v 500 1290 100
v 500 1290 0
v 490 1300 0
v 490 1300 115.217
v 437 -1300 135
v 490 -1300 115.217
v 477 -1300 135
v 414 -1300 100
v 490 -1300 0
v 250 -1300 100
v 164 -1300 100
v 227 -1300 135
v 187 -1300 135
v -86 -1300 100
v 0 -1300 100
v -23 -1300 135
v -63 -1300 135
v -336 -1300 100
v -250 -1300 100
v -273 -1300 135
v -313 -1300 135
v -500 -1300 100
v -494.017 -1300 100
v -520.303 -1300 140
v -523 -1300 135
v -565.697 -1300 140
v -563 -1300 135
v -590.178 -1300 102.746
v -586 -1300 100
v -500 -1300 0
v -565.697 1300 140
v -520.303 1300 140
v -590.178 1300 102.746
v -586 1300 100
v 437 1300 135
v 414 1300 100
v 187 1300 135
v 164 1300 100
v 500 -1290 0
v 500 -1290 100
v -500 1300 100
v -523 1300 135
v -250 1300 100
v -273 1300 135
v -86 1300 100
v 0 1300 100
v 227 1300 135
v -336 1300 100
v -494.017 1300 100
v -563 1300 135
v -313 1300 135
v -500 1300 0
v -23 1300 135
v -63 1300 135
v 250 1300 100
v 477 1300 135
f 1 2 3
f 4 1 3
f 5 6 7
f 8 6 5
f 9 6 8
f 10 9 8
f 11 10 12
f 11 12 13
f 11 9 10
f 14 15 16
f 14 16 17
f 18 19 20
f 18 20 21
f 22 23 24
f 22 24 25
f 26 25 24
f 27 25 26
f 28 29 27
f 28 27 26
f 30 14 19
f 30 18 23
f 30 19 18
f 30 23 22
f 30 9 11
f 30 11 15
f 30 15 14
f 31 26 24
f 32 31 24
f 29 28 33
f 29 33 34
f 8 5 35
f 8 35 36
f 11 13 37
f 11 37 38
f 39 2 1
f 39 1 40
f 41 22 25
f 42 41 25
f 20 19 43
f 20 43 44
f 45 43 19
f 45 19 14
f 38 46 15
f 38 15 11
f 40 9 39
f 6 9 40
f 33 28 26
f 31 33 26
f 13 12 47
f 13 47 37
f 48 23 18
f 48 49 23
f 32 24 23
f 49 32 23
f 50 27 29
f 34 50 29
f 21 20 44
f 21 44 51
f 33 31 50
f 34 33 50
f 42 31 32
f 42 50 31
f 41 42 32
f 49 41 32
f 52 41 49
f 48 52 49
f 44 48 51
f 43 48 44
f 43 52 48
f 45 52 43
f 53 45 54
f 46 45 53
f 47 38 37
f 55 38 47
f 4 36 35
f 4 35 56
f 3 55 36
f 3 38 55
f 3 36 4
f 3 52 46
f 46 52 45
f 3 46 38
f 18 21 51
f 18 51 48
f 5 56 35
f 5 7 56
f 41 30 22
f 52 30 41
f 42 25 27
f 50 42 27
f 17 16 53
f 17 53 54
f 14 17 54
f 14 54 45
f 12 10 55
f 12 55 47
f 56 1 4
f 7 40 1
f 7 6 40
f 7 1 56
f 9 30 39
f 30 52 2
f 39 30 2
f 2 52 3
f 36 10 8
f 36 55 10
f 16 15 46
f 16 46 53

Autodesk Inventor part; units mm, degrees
ref_plane "YZ Plane" through (0, 0, 0) normal (1, 0, 0) x (0, 1, 0)
ref_plane "XZ Plane" through (0, 0, 0) normal (0, 1, 0) x (-1, 0, 0)
ref_plane "XY Plane" through (0, 0, 0) normal (0, 0, 1) x (1, 0, 0)
sketch "Sketch1" plane through (0, 0, 0) normal (0, 0, 1) x (1, 0, 0)
  line L0 (-500, 1300) -> (500, 1300)
  line L1 (500, 1300) -> (500, -1300)
  line L2 (500, -1300) -> (-500, -1300)
  line L3 (-500, -1300) -> (-500, 1300)
  line L4 (-500, 1300) -> (500, -1300) construction
  line L5 (500, 1300) -> (-500, -1300) construction
  point P0 (0, 0)
  dimension "d0" = 1000
  dimension "d1" = 2600
extrude "Extrusion1" add sketch "Sketch1" along normal blind 100
sketch "Sketch2" plane through (-500, -1300, 0) normal (0, -1, 0) x (1, 0, 0)
  line L0 (0, 0) -> (1000, 0) projected
  line L1 (1000, 0) -> (1000, 100) projected
  line L2 (0, 100) -> (1000, 100) projected
  line L3 (0, 0) -> (0, 100) projected
  line L4 (0, 100) -> (1000, 100) projected
  line L5 (1000, 100) -> (977, 135)
  line L6 (977, 135) -> (937, 135)
  line L7 (937, 135) -> (914, 100)
  line L8 (687, 135) -> (664, 100)
  line L9 (727, 135) -> (687, 135)
  line L10 (750, 100) -> (727, 135)
  line L11 (437, 135) -> (414, 100)
  line L12 (477, 135) -> (437, 135)
  line L13 (500, 100) -> (477, 135)
  line L14 (187, 135) -> (164, 100)
  line L15 (227, 135) -> (187, 135)
  line L16 (250, 100) -> (227, 135)
  line L17 (-63, 135) -> (-86, 100)
  line L18 (-23, 135) -> (-63, 135)
  line L19 (0, 100) -> (-23, 135)
  line L20 (-90.1785, 102.7459) -> (-65.6973, 140)
  line L21 (-65.6973, 140) -> (-20.3027, 140)
  line L22 (-20.3027, 140) -> (5.983, 100)
  line L23 (-90.1785, 102.7459) -> (-86, 100)
  point P0 (500, 0)
  point P1 (5.983, 100)
  dimension "d4" = 86
  dimension "d5" = 40
  dimension "d6" = 35
  dimension "d11" = 250
  dimension "d16" = 5
  dimension "d17" = 5
extrude "Extrusion2" add sketch "Sketch2" against normal up to surface (2600 mm away) contours L19 L18 L17 L23 L20 L21 L22 L2 | L2 L7 L6 L5 | L14 L15 L16 L2 | L2 L8 L9 L10 | L11 L12 L13 L2
chamfer "Chamfer1" distance 10 angle 45 2 edges at (500, -1300, 50) (500, 1300, 50)
equation "\"d17\" = d16"
properties part number "Sandwich 5  roof long"
